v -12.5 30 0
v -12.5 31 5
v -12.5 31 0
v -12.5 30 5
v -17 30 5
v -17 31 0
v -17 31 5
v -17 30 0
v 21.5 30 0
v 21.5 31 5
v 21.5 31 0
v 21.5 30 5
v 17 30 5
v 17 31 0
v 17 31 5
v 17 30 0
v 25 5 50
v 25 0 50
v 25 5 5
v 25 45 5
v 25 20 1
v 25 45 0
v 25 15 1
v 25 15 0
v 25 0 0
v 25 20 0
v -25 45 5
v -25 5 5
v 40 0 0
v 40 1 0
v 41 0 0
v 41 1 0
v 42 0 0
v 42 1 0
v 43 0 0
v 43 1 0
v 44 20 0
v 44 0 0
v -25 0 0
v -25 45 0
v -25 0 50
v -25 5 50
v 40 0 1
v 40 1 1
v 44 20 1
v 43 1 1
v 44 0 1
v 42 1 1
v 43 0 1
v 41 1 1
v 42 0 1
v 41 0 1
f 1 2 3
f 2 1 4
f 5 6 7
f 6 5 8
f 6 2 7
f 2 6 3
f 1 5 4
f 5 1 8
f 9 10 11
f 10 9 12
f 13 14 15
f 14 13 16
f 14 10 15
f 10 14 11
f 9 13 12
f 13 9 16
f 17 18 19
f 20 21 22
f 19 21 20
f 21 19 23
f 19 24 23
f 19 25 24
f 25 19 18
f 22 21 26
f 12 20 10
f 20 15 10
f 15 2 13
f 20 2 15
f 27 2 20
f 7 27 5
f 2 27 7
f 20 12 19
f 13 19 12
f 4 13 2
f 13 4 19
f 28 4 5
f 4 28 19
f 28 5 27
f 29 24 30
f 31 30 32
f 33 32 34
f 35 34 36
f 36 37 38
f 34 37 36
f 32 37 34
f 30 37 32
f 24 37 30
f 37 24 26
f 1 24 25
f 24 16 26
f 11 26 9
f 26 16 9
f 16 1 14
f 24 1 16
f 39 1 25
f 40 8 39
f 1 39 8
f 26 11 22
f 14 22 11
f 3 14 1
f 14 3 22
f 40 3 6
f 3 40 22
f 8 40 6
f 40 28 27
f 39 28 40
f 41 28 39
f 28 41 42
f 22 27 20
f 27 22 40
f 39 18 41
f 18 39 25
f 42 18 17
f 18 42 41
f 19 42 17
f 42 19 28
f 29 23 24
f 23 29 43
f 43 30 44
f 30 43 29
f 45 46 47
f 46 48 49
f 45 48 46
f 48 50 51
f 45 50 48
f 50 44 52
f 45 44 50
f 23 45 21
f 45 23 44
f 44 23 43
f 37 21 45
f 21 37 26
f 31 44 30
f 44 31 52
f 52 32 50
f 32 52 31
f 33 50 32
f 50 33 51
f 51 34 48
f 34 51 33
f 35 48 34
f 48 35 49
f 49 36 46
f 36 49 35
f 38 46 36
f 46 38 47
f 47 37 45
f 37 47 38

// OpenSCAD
// L-shaped mounting bracket for NEMA 17 stepper motor (syringe pump)
// Print orientation: base plate on bed, vertical motor plate builds up +Z

// ---------------- Parameters ----------------
base_x0      = -25;   // base plate x start
base_x1      = 25;    // base plate x end
base_y0      = 0;     // base plate y start
base_y1      = 45;    // base plate y end
base_z       = 5;     // base plate thickness

motor_x0     = -25;   // motor plate x start
motor_x1     = 25;    // motor plate x end
motor_y      = 5;     // motor plate thickness (y end)
motor_z      = 50;    // motor plate height (z end)

boss_d       = 23;    // motor centring boss hole diameter
boss_x       = 0;     // boss hole centre x
boss_z       = 28;    // boss hole centre z

screw_d      = 3.4;   // M3 screw hole diameter
screw_n      = 4;     // number of screw holes
screw_pitch  = 31;    // square pattern side length

gusset_t     = 5;     // gusset thickness (x direction)
gusset_leg   = 20;    // right triangle legs along +Y and +Z
gusset_x0    = -25;   // gusset left edge x
gusset_x1    = -20;   // gusset right edge x (left gusset)
gusset_x2    = 20;    // gusset left edge x (right gusset)
gusset_x3    = 25;    // gusset right edge x (right gusset)

eps          = 0.5;   // cutter overshoot past faces
$fn          = 96;    // curve resolution

// ---------------- Model ----------------
union() {
    // Base plate with two vertical through-holes (M4)
    difference() {
        translate([base_x0, base_y0, 0])
            cube([base_x1 - base_x0, base_y1 - base_y0, base_z]);
        for (sx = [-17, 17])
            translate([sx, base_y1 - 15, -eps])
                cube([4.5, 1, base_z + 2 * eps]);
    }

    // Vertical motor plate standing on back edge of base
    difference() {
        translate([motor_x0, 0, 0])
            cube([motor_x1 - motor_x0, motor_y, motor_z]);
        // Motor centring boss hole (along Y)
        translate([boss_x, -eps, boss_z])
            rotate([90, 0, 0])
                cylinder(d = boss_d, h = motor_y + 2 * eps);
        // M3 screw holes on 31 mm square pattern, centred on boss hole
        for (i = [0 : screw_n - 1]) {
            a = screw_pitch * i / (screw_n - 1);
            translate([boss_x, -eps, boss_z])
                rotate([90, 0, 0])
                    translate([0, 0, a])
                        cylinder(d = screw_d, h = motor_y + 2 * eps);
        }
    }

    // Gussets: right triangle in YZ plane, flush with left and right edges
    for (gx = [gusset_x0, gusset_x2]) {
        translate([gx, 0, 0])
            for (x = [0 : gusset_t - 1])
                translate([x, 0, 0])
                    linear_extrude(1)
                        polygon([
                            [gusset_leg, gusset_leg], // hypotenuse end
                            [gusset_leg, 0],           // +Y leg
                            [0, gusset_leg]             // +Z leg
                        ]);
    }
}
